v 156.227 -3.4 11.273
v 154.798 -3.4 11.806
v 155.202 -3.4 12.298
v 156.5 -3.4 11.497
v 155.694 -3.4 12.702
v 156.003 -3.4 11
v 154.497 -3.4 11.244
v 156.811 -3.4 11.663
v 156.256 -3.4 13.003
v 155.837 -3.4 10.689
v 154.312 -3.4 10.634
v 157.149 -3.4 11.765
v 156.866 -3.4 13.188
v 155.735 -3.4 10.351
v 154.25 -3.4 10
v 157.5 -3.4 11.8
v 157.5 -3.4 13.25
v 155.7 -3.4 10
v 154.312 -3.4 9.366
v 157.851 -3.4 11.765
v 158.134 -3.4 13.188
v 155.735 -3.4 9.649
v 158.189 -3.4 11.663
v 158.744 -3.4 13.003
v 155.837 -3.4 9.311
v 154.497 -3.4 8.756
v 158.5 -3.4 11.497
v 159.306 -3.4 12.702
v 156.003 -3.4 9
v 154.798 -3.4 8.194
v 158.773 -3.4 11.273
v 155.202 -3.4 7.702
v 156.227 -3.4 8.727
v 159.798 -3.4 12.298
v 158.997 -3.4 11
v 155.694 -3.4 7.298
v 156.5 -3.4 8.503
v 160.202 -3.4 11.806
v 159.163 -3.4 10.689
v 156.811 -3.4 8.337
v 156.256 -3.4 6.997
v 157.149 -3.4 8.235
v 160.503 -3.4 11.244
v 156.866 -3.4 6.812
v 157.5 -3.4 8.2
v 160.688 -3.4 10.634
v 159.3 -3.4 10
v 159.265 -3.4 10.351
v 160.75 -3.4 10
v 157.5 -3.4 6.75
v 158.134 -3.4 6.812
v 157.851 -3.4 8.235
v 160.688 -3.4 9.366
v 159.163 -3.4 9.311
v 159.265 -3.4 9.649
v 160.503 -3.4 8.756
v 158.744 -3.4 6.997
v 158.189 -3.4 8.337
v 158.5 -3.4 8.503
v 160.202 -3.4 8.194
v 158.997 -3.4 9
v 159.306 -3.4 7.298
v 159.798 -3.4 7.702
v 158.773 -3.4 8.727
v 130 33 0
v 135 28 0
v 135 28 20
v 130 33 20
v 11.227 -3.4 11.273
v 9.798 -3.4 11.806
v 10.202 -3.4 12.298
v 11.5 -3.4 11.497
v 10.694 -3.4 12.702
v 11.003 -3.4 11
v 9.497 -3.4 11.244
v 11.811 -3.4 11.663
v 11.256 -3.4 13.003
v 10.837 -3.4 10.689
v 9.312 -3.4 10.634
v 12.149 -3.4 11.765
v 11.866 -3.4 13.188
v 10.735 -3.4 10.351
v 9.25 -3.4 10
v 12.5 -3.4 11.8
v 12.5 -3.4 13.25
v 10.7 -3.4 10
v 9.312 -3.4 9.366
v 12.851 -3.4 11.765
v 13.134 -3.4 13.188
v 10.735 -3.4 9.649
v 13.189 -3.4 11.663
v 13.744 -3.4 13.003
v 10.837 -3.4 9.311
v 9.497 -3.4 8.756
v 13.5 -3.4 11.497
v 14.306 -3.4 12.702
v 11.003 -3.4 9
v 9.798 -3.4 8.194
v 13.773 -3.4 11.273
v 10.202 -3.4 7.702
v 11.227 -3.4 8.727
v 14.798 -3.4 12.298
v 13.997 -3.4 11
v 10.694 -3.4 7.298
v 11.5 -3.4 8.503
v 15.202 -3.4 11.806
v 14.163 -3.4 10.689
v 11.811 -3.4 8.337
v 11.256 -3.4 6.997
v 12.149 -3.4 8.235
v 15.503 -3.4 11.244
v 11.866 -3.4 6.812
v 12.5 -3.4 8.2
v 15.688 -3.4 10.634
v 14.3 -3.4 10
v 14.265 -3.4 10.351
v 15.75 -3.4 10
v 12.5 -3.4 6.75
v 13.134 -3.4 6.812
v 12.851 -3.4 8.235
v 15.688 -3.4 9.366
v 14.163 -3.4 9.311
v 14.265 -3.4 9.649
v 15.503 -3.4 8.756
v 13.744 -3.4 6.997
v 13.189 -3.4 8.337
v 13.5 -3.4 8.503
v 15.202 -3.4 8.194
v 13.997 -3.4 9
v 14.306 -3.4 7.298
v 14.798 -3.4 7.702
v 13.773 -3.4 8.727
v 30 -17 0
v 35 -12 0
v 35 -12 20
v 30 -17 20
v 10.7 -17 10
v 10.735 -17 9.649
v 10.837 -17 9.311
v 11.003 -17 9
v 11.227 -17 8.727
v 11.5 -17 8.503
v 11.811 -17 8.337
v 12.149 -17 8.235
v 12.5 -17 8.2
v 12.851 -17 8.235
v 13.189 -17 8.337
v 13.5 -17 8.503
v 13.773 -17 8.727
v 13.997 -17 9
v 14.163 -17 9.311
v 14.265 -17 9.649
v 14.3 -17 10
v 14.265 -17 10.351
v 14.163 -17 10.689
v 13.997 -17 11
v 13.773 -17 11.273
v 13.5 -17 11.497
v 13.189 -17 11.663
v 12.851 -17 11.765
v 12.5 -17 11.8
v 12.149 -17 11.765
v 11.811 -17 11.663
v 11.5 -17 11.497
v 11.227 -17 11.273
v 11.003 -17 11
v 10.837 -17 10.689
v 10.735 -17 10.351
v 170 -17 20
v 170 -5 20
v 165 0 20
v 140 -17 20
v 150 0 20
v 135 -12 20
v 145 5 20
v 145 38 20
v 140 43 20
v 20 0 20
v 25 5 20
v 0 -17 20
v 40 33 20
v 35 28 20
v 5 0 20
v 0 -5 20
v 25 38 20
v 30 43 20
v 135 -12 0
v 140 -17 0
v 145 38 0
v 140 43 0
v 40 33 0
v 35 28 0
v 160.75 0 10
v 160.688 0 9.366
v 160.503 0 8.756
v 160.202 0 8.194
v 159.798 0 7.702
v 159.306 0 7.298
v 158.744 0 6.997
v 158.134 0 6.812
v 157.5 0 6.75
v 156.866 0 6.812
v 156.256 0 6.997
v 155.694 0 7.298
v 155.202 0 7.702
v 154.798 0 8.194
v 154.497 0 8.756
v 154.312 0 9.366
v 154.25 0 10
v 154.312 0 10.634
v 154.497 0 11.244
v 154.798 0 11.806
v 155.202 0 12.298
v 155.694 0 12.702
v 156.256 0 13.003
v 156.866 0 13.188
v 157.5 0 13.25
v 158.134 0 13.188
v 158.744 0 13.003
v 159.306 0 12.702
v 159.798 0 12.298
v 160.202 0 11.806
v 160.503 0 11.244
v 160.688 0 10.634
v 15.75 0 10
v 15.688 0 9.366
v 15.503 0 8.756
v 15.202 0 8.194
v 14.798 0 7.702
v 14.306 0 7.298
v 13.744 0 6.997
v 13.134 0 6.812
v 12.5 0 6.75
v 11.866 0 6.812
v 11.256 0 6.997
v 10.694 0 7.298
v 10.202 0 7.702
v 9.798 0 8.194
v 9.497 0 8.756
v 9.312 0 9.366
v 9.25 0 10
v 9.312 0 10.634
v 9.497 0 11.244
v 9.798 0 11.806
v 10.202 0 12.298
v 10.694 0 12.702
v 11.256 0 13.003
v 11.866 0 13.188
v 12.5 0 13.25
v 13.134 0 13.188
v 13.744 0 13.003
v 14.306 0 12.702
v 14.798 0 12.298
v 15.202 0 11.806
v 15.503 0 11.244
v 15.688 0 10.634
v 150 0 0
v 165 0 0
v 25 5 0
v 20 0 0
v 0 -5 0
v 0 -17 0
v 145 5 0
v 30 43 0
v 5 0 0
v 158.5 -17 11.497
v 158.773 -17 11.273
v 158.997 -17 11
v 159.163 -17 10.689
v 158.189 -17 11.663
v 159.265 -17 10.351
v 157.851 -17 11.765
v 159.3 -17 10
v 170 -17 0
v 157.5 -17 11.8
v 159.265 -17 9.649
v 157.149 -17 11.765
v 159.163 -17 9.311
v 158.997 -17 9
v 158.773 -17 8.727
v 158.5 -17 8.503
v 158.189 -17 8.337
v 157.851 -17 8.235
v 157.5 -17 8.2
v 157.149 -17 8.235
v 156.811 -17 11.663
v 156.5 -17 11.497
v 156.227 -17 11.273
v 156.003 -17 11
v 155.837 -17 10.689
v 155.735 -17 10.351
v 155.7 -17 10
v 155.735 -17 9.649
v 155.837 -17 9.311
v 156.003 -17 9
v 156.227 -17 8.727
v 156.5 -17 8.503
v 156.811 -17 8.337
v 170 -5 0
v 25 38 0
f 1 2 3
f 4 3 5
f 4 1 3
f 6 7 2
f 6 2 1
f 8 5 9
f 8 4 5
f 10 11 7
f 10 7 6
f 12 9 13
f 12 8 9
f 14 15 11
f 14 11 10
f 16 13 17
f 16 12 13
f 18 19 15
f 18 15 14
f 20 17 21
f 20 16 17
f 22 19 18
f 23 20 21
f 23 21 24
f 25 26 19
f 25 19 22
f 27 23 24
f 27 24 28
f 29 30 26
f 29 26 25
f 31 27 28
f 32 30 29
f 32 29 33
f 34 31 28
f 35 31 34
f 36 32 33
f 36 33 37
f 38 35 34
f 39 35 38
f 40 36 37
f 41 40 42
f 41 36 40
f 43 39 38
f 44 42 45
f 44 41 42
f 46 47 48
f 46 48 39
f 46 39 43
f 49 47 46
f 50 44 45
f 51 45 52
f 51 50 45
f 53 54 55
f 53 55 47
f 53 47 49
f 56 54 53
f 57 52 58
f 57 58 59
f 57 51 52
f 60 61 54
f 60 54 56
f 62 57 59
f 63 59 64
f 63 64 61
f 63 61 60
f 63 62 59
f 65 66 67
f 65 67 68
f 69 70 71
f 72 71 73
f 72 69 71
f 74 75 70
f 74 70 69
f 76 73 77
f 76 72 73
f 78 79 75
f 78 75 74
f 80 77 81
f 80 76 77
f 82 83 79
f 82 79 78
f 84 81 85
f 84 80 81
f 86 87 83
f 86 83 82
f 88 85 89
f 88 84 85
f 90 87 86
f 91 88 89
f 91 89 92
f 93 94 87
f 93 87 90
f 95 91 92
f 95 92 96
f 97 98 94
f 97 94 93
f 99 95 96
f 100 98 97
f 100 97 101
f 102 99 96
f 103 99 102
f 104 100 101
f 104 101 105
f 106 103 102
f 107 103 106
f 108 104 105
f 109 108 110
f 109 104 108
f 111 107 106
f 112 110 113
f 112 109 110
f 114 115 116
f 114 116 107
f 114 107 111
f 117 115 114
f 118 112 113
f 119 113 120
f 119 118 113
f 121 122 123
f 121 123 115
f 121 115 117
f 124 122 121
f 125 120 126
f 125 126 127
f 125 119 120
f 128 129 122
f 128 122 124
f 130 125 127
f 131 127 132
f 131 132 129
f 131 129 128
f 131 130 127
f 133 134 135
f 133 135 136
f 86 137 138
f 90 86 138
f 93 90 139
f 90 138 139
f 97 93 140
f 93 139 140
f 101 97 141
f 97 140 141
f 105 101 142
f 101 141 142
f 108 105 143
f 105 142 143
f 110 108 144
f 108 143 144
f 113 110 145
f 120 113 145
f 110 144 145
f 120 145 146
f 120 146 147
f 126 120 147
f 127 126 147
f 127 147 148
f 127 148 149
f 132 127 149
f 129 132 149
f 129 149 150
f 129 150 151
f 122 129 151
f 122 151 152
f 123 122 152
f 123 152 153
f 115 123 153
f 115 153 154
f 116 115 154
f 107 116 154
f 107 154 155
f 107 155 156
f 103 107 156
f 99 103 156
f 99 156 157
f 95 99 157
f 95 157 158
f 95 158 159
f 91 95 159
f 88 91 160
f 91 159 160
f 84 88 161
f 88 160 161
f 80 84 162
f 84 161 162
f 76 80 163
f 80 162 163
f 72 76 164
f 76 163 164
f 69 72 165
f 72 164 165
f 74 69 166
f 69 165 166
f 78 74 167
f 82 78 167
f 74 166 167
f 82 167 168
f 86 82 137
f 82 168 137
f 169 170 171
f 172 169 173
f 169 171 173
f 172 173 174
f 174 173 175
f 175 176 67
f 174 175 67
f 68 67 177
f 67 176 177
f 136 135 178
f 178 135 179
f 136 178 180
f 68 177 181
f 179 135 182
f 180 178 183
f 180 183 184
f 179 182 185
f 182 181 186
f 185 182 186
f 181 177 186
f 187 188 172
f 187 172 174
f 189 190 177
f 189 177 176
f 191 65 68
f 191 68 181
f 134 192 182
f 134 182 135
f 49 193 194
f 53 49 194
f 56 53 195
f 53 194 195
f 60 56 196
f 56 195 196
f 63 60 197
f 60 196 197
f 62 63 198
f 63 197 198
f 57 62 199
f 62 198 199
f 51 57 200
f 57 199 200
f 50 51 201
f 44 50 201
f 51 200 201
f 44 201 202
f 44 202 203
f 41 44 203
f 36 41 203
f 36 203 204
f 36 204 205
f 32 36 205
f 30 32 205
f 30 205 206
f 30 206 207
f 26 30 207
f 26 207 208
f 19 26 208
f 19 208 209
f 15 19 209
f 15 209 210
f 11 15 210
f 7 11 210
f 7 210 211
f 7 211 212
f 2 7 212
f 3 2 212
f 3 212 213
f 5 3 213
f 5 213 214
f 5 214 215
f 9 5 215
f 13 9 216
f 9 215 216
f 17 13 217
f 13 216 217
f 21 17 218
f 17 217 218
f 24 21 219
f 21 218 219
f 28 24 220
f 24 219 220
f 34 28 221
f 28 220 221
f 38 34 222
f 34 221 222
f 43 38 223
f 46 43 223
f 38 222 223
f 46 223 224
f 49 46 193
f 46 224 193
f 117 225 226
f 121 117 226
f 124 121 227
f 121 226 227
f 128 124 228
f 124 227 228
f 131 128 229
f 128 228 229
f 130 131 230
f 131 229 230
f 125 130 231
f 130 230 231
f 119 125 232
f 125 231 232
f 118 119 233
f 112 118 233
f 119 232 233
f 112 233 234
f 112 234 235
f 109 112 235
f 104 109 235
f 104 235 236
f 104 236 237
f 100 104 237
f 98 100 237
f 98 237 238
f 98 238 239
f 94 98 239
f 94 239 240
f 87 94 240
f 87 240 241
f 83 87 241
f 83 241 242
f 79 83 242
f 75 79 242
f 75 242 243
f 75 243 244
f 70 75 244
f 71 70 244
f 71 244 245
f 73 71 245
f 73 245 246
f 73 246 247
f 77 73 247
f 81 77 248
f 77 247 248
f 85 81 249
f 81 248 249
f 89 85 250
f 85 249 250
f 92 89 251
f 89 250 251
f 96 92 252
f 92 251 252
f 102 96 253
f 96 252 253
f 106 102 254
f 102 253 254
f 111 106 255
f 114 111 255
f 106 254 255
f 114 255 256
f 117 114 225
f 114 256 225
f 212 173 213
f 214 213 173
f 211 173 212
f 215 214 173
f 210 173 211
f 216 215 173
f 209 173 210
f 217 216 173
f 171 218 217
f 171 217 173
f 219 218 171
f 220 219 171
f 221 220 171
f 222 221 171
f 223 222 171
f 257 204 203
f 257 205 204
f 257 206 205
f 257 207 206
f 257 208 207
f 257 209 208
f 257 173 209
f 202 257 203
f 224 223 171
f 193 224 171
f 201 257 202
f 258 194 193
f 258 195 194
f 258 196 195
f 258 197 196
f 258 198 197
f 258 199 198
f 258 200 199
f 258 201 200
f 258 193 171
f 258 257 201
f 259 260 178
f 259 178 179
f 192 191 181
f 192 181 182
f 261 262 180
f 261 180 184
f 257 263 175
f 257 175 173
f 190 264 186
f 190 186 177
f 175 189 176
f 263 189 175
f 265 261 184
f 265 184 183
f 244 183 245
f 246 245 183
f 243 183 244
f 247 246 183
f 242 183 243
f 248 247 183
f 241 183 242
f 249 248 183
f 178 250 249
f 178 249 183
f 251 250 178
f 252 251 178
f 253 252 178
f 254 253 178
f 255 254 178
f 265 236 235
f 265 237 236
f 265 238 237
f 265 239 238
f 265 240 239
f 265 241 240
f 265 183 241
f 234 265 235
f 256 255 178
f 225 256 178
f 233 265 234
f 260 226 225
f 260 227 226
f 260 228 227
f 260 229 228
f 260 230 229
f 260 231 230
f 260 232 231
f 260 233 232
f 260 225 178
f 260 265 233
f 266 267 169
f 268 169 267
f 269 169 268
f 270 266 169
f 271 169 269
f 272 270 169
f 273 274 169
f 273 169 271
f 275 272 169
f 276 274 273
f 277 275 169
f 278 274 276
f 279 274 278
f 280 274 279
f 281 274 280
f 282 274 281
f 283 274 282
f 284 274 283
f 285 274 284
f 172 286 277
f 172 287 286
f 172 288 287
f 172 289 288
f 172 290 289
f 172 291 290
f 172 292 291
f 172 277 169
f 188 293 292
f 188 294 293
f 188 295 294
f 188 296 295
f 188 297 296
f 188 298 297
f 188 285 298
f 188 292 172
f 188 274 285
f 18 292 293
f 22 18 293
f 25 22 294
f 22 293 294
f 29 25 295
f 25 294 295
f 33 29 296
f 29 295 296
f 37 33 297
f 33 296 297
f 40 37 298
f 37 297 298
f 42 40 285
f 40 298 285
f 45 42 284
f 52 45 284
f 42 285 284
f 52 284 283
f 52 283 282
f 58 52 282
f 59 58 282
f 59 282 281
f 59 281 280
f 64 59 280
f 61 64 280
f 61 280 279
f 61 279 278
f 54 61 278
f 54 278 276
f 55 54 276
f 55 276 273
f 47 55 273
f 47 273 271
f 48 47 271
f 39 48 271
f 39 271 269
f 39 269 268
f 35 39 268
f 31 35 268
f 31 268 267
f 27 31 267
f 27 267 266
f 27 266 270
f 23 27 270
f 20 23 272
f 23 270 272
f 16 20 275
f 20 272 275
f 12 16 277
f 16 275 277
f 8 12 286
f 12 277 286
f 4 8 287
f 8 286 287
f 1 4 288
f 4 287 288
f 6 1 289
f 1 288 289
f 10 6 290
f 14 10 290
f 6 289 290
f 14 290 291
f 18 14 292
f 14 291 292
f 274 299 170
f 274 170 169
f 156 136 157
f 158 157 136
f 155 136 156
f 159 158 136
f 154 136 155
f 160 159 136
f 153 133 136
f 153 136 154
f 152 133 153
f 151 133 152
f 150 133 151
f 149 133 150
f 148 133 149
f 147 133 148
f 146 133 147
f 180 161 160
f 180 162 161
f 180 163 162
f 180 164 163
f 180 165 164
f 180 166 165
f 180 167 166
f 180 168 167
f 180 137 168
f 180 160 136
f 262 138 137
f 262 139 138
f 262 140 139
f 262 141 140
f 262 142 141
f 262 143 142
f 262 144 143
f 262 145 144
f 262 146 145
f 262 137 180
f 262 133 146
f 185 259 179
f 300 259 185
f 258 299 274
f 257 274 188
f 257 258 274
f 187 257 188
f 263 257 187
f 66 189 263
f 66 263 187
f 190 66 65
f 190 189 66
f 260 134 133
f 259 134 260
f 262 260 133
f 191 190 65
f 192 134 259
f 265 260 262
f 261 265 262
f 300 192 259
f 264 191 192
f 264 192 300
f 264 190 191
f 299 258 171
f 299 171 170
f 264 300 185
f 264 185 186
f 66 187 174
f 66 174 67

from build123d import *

# Parameters (mm, degrees)
AUFSATZ_LINEAR_AUSTRAGEN1_DEPTH                      = 20
STIRNSENKUNG_F_R_M3_ZYLINDERSCHRAUBE_MIT_D           = 3.6
STIRNSENKUNG_F_R_M3_ZYLINDERSCHRAUBE_MIT_DEPTH       = 17
STIRNSENKUNG_F_R_M3_ZYLINDERSCHRAUBE_MIT_CBORE_D     = 6.5
STIRNSENKUNG_F_R_M3_ZYLINDERSCHRAUBE_MIT_CBORE_DEPTH = 3.4


with BuildPart() as part:
    # Skizze1 → Aufsatz-Linear austragen1 (new body)
    with BuildSketch(Plane.XY):
        Polygon((5, 0), (20, 0), (25, 5), (25, 38), (30, 43), (140, 43), (145, 38), (145, 5), (150, 0), (165, 0), (170, -5), (170, -17), (140, -17), (135, -12), (135, 28), (130, 33), (40, 33), (35, 28), (35, -12), (30, -17), (0, -17), (0, -5), align=None)
    extrude(amount=AUFSATZ_LINEAR_AUSTRAGEN1_DEPTH)

    # Stirnsenkung für M3 Zylinderschraube mit Innensechskant2
    with Locations(Plane(origin=(0, 0, 0), x_dir=(1, 0, 0), z_dir=(0, 1, 0))):
        with Locations((157.5, -10), (12.5, -10)):
            CounterBoreHole(STIRNSENKUNG_F_R_M3_ZYLINDERSCHRAUBE_MIT_D / 2, STIRNSENKUNG_F_R_M3_ZYLINDERSCHRAUBE_MIT_CBORE_D / 2, STIRNSENKUNG_F_R_M3_ZYLINDERSCHRAUBE_MIT_CBORE_DEPTH, depth=STIRNSENKUNG_F_R_M3_ZYLINDERSCHRAUBE_MIT_DEPTH)


solid = part.part
